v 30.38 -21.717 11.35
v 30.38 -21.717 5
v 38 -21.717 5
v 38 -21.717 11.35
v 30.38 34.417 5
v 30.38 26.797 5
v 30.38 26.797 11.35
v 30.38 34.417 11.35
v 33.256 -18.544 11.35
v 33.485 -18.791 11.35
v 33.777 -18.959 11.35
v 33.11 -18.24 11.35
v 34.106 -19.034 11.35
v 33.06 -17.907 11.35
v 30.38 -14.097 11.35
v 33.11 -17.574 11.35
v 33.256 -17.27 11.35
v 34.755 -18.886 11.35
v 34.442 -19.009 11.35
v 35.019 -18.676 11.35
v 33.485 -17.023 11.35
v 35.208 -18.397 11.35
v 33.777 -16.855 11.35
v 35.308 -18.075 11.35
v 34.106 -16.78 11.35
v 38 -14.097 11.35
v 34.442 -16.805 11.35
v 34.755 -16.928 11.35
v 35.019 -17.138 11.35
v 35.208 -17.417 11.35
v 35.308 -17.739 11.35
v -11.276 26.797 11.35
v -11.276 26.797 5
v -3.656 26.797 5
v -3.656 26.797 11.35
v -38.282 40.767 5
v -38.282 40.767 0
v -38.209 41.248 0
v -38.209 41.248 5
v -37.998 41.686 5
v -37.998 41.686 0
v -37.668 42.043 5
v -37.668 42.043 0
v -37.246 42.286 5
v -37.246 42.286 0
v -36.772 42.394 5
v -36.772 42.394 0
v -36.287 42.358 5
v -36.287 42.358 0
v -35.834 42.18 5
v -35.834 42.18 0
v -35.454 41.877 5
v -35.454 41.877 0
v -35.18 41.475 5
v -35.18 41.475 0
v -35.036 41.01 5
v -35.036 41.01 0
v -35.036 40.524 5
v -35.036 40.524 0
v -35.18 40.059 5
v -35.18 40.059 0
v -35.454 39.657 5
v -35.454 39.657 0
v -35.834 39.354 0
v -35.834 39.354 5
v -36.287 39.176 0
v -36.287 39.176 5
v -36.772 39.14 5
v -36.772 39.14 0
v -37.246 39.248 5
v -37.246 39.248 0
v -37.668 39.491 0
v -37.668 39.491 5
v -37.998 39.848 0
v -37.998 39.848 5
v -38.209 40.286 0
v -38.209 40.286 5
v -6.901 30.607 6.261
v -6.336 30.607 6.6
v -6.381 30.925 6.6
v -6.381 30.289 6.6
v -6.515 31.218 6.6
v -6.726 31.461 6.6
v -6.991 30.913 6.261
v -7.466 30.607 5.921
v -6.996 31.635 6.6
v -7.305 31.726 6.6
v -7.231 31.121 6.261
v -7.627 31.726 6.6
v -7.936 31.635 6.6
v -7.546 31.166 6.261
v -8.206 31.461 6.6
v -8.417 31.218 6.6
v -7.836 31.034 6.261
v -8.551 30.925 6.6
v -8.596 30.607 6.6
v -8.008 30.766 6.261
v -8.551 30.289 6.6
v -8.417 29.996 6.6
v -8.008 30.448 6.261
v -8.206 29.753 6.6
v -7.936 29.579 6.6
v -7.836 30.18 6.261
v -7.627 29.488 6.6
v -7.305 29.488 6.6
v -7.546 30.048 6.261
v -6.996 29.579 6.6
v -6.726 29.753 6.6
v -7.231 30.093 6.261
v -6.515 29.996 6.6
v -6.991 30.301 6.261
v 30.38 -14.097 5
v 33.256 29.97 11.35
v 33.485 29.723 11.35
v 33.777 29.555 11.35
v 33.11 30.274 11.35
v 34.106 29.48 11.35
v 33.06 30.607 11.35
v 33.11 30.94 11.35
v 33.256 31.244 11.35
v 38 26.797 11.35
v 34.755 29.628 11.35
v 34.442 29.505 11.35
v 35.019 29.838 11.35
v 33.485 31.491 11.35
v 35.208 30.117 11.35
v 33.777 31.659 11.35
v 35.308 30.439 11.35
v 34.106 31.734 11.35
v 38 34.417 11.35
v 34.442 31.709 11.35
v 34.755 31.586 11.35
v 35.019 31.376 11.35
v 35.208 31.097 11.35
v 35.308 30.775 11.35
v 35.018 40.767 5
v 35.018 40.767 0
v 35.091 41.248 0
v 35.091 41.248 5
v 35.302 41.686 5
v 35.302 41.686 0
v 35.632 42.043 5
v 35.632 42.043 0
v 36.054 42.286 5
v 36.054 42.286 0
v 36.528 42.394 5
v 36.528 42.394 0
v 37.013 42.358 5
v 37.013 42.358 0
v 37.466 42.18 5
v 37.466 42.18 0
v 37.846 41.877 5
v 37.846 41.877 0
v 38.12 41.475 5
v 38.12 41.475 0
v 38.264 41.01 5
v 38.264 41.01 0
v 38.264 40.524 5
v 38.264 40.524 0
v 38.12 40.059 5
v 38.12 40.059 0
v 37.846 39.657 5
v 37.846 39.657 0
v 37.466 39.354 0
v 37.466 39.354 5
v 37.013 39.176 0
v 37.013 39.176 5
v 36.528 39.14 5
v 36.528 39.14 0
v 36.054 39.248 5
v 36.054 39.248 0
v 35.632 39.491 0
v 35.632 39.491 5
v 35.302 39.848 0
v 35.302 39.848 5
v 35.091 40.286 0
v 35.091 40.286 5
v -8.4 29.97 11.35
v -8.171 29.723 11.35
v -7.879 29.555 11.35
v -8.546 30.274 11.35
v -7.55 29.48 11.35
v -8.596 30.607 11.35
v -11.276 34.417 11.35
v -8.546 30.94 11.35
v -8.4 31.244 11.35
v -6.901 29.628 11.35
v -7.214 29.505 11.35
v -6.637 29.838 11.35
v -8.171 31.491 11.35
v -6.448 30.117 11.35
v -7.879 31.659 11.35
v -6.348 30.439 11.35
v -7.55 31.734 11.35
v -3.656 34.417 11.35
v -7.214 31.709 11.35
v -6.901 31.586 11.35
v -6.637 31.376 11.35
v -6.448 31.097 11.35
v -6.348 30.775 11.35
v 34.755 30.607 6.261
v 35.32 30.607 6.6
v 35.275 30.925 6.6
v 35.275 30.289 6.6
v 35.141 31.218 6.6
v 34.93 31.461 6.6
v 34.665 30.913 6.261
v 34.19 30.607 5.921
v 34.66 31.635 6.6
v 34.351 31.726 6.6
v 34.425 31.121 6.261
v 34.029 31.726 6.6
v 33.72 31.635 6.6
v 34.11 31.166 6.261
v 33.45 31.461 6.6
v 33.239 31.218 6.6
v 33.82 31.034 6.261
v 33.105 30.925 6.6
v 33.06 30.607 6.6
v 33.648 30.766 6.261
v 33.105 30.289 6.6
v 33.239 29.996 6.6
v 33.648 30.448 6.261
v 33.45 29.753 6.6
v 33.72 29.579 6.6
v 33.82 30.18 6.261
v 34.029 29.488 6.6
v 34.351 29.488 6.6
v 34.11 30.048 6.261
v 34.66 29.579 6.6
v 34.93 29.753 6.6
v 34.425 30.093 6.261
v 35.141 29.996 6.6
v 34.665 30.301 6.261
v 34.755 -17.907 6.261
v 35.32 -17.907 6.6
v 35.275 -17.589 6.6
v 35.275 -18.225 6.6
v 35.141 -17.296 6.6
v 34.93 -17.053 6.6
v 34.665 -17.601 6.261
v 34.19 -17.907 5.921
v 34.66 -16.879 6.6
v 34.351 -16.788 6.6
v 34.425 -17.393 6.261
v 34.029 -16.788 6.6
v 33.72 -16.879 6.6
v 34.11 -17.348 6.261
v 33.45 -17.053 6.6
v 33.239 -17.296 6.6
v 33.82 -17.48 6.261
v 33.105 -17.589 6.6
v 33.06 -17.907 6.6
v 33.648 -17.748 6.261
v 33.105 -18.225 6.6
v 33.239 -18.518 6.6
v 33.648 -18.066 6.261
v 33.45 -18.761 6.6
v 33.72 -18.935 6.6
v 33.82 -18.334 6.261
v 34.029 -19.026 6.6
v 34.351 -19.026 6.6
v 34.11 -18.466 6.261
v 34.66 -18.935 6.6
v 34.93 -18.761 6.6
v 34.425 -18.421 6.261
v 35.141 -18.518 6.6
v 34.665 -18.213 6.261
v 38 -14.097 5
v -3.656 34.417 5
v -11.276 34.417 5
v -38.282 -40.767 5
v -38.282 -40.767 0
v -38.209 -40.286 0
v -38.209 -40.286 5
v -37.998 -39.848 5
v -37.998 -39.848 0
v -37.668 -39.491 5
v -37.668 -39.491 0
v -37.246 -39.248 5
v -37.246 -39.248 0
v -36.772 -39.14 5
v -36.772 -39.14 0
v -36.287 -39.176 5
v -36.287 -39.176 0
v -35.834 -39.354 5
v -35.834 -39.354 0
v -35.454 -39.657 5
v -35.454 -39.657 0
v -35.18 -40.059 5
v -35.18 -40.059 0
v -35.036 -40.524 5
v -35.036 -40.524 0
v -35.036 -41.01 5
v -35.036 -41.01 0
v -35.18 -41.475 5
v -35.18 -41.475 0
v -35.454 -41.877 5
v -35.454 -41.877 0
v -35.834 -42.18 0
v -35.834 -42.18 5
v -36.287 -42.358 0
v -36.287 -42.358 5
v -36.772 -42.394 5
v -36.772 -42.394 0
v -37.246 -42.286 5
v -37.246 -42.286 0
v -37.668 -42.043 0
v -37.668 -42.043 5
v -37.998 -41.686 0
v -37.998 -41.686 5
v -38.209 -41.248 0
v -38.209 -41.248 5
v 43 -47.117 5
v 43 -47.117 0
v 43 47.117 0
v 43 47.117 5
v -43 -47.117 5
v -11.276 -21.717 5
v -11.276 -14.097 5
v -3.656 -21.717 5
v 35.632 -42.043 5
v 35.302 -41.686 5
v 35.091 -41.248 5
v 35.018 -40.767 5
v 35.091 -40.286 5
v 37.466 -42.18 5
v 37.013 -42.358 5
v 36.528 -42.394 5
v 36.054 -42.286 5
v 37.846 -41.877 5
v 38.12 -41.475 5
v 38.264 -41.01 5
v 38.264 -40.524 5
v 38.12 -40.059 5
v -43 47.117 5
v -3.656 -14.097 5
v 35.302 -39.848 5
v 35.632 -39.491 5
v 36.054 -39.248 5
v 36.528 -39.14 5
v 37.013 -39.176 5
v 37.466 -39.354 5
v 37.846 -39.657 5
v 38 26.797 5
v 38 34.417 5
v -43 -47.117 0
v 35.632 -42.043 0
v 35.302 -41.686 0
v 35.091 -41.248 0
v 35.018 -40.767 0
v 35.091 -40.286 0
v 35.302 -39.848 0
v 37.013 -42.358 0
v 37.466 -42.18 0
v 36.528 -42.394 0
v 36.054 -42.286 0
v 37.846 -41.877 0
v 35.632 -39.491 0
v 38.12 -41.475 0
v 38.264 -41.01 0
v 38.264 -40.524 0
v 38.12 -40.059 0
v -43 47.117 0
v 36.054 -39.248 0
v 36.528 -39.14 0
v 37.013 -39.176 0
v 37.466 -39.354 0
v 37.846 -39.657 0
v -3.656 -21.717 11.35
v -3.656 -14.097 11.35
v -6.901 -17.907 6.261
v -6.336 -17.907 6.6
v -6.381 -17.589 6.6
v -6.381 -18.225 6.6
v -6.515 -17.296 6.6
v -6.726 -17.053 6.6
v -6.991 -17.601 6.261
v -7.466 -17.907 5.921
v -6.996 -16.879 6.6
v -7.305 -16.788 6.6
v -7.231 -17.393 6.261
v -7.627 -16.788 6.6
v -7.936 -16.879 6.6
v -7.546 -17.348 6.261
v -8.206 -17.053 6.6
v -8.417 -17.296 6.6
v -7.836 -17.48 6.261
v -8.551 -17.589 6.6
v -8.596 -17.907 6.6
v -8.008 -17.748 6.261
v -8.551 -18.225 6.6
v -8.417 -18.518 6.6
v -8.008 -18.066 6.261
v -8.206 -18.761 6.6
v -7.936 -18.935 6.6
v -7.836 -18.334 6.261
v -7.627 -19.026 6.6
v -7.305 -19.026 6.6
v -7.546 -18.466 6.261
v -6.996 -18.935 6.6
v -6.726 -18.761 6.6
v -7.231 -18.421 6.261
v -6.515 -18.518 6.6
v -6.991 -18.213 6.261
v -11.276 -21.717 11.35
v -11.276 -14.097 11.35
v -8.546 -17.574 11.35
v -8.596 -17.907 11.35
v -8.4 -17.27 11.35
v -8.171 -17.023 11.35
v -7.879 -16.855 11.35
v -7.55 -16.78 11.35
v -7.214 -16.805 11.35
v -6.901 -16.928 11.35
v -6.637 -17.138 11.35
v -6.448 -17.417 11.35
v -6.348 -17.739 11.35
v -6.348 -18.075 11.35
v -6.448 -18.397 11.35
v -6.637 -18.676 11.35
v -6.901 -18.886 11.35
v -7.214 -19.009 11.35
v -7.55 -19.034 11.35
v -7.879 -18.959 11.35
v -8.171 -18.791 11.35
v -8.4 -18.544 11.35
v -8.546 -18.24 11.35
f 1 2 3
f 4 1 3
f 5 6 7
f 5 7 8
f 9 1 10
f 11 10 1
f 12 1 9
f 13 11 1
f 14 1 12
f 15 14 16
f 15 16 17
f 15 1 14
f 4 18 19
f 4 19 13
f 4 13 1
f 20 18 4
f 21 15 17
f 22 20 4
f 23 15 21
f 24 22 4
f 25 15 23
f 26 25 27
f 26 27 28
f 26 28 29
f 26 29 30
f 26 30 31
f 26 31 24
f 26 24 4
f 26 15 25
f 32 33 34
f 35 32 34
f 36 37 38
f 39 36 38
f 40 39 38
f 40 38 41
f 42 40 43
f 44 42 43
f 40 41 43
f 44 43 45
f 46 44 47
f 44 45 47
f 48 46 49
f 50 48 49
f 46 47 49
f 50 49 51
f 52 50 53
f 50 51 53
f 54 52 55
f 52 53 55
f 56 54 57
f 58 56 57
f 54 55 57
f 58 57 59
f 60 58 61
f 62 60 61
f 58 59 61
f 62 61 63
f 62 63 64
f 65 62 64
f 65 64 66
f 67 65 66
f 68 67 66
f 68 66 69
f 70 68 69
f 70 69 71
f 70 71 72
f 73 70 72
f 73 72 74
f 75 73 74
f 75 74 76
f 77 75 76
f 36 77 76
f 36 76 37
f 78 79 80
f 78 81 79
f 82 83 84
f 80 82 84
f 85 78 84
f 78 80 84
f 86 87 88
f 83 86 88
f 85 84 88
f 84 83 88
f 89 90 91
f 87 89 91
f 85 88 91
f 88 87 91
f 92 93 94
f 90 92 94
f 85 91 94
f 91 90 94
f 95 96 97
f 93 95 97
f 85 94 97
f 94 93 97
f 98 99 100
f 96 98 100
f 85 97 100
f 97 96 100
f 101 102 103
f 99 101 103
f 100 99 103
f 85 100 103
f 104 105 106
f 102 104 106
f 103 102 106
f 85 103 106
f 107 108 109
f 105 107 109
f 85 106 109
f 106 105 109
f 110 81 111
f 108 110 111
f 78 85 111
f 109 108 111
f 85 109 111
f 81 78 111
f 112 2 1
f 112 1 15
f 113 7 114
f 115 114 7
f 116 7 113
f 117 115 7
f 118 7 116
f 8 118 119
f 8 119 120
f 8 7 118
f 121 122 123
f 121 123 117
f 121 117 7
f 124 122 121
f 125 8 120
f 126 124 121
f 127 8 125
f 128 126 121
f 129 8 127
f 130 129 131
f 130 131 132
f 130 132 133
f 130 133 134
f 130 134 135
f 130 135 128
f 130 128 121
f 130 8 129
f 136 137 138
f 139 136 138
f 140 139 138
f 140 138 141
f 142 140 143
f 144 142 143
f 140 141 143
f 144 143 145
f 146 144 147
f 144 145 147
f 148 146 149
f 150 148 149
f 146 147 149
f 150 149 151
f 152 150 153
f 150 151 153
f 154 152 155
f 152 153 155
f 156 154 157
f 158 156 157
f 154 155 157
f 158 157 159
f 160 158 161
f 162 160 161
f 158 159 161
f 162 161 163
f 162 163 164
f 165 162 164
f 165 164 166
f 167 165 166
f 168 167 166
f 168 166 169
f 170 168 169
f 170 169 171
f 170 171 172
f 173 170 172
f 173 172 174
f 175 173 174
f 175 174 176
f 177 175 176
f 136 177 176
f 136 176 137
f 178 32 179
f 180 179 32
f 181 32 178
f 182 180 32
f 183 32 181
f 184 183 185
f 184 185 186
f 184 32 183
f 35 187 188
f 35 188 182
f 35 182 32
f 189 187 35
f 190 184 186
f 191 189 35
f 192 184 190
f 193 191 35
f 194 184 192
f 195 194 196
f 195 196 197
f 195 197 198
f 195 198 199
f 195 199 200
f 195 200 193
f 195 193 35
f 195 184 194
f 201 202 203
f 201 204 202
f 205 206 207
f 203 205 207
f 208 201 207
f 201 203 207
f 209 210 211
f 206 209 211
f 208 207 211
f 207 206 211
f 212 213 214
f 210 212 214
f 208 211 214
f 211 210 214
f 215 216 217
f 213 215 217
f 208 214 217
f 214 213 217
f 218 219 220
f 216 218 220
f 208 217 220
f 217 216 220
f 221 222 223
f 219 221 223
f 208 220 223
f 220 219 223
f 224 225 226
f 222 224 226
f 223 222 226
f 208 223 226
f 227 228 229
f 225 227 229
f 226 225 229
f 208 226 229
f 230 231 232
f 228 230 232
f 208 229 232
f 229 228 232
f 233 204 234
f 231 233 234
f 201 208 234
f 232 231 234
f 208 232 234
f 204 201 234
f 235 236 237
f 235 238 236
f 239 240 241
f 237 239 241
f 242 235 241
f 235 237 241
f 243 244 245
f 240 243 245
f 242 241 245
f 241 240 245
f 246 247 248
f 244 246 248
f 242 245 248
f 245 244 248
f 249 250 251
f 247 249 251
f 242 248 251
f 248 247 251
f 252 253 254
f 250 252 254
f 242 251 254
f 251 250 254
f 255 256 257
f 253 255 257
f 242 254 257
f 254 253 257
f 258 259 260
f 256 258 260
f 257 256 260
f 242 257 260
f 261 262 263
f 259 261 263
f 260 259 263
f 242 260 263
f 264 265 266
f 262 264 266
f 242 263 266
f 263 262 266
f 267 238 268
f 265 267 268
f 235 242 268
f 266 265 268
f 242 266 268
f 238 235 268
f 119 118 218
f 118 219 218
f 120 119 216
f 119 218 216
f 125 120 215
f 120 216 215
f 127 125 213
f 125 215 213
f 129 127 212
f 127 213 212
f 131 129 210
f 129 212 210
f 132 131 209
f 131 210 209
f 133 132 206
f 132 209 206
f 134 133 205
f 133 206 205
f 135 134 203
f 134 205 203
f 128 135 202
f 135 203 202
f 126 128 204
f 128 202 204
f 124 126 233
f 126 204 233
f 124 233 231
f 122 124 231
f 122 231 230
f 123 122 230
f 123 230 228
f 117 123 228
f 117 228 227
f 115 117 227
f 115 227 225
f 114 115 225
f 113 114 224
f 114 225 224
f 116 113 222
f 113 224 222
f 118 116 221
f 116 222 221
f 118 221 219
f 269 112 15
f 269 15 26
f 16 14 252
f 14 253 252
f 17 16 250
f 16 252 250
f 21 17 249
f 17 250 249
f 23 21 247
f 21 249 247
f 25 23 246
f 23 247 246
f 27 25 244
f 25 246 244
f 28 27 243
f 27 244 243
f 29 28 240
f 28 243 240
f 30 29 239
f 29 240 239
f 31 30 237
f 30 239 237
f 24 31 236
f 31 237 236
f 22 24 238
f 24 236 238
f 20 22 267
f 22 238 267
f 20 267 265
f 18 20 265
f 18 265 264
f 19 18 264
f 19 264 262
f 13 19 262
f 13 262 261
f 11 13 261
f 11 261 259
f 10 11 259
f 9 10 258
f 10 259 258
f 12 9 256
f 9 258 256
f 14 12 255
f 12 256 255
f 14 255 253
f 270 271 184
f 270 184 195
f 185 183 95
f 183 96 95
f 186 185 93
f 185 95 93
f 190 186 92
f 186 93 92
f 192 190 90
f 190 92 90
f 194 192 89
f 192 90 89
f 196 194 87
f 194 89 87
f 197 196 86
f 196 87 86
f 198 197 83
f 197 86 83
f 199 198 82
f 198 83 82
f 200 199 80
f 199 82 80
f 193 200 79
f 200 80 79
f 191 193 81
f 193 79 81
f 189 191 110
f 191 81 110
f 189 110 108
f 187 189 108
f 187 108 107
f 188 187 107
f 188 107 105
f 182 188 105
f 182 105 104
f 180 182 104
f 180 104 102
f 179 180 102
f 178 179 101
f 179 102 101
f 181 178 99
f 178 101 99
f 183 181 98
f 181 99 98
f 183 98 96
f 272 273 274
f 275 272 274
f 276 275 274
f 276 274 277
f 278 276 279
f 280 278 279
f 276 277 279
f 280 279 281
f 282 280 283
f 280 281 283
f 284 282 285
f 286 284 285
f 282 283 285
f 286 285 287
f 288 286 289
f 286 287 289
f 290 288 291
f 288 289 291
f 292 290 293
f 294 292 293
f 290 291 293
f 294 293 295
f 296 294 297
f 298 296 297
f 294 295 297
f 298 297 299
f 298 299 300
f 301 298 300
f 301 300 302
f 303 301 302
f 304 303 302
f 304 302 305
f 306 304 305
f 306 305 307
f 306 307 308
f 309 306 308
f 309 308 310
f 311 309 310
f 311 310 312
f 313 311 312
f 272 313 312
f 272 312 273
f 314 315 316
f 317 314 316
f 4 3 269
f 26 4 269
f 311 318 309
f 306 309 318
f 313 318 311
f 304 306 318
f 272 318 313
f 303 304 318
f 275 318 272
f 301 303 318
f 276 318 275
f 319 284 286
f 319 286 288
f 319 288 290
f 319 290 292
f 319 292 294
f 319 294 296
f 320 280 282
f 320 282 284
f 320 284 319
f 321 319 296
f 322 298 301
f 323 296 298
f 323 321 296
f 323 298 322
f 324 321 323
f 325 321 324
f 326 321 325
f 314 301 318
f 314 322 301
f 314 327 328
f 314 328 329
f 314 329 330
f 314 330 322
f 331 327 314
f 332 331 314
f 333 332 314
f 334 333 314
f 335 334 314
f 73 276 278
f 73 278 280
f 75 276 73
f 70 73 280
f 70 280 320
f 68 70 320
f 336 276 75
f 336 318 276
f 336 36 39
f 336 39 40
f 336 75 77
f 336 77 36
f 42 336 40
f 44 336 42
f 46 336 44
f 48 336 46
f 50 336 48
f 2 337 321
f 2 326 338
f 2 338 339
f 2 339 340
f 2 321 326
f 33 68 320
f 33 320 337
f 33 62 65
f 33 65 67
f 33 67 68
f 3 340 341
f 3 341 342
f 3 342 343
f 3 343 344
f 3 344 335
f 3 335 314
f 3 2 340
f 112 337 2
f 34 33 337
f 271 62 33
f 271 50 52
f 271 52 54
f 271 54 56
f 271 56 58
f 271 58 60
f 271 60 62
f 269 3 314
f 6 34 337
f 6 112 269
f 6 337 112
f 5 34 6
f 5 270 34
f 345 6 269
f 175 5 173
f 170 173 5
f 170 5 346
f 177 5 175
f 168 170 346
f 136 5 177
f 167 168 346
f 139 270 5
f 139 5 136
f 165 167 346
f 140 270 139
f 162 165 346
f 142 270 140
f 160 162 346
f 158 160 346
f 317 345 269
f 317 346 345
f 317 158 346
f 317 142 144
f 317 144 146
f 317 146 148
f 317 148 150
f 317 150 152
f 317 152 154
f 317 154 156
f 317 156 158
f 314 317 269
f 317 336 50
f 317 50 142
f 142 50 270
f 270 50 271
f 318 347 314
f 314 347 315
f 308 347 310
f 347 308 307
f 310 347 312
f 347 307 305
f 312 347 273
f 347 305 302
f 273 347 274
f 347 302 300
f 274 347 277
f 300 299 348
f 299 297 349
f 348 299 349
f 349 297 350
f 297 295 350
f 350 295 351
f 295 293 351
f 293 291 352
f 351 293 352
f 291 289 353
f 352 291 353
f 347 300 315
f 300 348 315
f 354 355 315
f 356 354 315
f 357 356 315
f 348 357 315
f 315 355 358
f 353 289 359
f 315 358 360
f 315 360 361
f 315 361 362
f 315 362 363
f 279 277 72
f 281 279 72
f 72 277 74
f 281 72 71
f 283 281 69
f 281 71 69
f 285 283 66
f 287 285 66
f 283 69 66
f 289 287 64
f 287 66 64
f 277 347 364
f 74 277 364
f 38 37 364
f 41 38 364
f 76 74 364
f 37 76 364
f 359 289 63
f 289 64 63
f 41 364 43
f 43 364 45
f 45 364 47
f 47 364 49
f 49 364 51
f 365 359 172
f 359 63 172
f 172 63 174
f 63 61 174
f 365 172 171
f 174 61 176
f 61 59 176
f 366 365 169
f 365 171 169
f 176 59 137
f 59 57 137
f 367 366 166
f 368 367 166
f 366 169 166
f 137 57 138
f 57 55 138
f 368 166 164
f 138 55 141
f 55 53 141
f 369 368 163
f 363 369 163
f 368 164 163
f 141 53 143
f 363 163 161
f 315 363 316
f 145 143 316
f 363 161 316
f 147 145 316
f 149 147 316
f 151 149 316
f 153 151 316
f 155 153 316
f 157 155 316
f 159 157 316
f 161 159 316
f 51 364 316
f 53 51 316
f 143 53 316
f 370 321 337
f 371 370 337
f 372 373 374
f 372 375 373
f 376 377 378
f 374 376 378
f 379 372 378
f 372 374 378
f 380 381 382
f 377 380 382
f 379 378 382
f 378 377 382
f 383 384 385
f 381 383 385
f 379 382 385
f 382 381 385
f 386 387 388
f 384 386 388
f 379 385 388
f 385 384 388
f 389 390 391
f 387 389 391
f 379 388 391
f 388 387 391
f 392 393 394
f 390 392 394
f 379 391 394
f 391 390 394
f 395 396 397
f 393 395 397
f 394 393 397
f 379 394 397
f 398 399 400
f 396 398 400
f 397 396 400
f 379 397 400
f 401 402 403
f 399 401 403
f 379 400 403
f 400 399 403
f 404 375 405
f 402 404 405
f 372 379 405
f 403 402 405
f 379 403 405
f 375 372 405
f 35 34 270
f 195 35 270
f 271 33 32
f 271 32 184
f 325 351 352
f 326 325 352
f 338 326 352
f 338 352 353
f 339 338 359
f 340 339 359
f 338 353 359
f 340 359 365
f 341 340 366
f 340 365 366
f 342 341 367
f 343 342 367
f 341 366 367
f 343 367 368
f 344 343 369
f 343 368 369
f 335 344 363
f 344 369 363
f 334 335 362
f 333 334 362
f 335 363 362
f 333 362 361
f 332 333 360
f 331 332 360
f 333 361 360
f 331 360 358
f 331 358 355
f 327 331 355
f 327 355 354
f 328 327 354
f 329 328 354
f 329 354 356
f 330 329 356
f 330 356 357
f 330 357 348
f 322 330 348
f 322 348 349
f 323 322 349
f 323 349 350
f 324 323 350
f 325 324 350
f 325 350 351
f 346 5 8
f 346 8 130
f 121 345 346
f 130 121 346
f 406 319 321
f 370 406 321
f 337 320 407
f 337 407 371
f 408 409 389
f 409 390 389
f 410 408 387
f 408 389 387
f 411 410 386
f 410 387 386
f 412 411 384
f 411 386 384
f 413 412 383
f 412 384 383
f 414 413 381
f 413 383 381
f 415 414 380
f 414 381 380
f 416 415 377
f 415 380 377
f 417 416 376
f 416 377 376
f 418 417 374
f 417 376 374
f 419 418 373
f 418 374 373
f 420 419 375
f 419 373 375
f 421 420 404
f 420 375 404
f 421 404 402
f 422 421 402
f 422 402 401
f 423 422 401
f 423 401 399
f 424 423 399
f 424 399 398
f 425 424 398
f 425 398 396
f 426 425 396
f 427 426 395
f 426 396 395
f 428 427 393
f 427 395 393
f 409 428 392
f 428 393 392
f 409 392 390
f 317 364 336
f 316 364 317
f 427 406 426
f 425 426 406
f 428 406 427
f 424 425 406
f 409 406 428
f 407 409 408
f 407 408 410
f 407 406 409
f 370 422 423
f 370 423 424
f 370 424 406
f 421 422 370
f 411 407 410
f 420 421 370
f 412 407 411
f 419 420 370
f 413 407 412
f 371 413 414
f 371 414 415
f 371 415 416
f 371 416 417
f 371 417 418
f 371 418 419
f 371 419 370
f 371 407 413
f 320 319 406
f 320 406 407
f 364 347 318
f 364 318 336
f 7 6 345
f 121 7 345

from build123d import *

# Parameters (mm, degrees)
SKETCH1_W                 = 85.999999704
SKETCH1_H                 = 94.234
BOSS_EXTRUDE1_DEPTH       = 4.999999906
SKETCH2_W                 = 7.62
SKETCH2_H                 = 7.62
BOSS_EXTRUDE2_DEPTH       = 6.35
F_4_40_TAPPED_HOLE1_D     = 2.2606
F_4_40_TAPPED_HOLE1_DEPTH = 4.7498
F_4_40_TAPPED_HOLE1_TIP   = 0.679152758
F_4_CLEARANCE_HOLE1_D     = 3.2639


with BuildPart() as part:
    # Sketch1 → Boss-Extrude1 (new body)
    with BuildSketch(Plane.XY):
        Rectangle(SKETCH1_W, SKETCH1_H)
    extrude(amount=BOSS_EXTRUDE1_DEPTH)

    # Sketch2 → Boss-Extrude2 (add)
    with BuildSketch(Plane.XY.offset(4.999999906)):
        with Locations((-7.466000054, 30.607)):
            Rectangle(SKETCH2_W, SKETCH2_H)
        with Locations((34.189999946, 30.607)):
            Rectangle(SKETCH2_W, SKETCH2_H)
        with Locations((-7.466000054, -17.907)):
            Rectangle(SKETCH2_W, SKETCH2_H)
        with Locations((34.189999946, -17.907)):
            Rectangle(SKETCH2_W, SKETCH2_H)
    extrude(amount=BOSS_EXTRUDE2_DEPTH)

    # #4-40 Tapped Hole1
    with Locations(Plane.XY.offset(11.349999906)):
        with Locations((-7.466000054, 30.607), (34.189999946, 30.607), (-7.466000054, -17.907), (34.189999946, -17.907)):
            Hole(F_4_40_TAPPED_HOLE1_D / 2, depth=F_4_40_TAPPED_HOLE1_DEPTH)
            with Locations((0, 0, -(F_4_40_TAPPED_HOLE1_DEPTH + F_4_40_TAPPED_HOLE1_TIP / 2))):  # 118° drill point
                Cone(0, F_4_40_TAPPED_HOLE1_D / 2, F_4_40_TAPPED_HOLE1_TIP, mode=Mode.SUBTRACT)

    # #4 Clearance Hole1 (through all)
    with Locations(Plane.XY.offset(4.999999906)):
        with Locations((-36.649999852, 40.767), (36.649999852, 40.767), (-36.649999852, -40.767), (36.649999852, -40.767)):
            Hole(F_4_CLEARANCE_HOLE1_D / 2)


solid = part.part
